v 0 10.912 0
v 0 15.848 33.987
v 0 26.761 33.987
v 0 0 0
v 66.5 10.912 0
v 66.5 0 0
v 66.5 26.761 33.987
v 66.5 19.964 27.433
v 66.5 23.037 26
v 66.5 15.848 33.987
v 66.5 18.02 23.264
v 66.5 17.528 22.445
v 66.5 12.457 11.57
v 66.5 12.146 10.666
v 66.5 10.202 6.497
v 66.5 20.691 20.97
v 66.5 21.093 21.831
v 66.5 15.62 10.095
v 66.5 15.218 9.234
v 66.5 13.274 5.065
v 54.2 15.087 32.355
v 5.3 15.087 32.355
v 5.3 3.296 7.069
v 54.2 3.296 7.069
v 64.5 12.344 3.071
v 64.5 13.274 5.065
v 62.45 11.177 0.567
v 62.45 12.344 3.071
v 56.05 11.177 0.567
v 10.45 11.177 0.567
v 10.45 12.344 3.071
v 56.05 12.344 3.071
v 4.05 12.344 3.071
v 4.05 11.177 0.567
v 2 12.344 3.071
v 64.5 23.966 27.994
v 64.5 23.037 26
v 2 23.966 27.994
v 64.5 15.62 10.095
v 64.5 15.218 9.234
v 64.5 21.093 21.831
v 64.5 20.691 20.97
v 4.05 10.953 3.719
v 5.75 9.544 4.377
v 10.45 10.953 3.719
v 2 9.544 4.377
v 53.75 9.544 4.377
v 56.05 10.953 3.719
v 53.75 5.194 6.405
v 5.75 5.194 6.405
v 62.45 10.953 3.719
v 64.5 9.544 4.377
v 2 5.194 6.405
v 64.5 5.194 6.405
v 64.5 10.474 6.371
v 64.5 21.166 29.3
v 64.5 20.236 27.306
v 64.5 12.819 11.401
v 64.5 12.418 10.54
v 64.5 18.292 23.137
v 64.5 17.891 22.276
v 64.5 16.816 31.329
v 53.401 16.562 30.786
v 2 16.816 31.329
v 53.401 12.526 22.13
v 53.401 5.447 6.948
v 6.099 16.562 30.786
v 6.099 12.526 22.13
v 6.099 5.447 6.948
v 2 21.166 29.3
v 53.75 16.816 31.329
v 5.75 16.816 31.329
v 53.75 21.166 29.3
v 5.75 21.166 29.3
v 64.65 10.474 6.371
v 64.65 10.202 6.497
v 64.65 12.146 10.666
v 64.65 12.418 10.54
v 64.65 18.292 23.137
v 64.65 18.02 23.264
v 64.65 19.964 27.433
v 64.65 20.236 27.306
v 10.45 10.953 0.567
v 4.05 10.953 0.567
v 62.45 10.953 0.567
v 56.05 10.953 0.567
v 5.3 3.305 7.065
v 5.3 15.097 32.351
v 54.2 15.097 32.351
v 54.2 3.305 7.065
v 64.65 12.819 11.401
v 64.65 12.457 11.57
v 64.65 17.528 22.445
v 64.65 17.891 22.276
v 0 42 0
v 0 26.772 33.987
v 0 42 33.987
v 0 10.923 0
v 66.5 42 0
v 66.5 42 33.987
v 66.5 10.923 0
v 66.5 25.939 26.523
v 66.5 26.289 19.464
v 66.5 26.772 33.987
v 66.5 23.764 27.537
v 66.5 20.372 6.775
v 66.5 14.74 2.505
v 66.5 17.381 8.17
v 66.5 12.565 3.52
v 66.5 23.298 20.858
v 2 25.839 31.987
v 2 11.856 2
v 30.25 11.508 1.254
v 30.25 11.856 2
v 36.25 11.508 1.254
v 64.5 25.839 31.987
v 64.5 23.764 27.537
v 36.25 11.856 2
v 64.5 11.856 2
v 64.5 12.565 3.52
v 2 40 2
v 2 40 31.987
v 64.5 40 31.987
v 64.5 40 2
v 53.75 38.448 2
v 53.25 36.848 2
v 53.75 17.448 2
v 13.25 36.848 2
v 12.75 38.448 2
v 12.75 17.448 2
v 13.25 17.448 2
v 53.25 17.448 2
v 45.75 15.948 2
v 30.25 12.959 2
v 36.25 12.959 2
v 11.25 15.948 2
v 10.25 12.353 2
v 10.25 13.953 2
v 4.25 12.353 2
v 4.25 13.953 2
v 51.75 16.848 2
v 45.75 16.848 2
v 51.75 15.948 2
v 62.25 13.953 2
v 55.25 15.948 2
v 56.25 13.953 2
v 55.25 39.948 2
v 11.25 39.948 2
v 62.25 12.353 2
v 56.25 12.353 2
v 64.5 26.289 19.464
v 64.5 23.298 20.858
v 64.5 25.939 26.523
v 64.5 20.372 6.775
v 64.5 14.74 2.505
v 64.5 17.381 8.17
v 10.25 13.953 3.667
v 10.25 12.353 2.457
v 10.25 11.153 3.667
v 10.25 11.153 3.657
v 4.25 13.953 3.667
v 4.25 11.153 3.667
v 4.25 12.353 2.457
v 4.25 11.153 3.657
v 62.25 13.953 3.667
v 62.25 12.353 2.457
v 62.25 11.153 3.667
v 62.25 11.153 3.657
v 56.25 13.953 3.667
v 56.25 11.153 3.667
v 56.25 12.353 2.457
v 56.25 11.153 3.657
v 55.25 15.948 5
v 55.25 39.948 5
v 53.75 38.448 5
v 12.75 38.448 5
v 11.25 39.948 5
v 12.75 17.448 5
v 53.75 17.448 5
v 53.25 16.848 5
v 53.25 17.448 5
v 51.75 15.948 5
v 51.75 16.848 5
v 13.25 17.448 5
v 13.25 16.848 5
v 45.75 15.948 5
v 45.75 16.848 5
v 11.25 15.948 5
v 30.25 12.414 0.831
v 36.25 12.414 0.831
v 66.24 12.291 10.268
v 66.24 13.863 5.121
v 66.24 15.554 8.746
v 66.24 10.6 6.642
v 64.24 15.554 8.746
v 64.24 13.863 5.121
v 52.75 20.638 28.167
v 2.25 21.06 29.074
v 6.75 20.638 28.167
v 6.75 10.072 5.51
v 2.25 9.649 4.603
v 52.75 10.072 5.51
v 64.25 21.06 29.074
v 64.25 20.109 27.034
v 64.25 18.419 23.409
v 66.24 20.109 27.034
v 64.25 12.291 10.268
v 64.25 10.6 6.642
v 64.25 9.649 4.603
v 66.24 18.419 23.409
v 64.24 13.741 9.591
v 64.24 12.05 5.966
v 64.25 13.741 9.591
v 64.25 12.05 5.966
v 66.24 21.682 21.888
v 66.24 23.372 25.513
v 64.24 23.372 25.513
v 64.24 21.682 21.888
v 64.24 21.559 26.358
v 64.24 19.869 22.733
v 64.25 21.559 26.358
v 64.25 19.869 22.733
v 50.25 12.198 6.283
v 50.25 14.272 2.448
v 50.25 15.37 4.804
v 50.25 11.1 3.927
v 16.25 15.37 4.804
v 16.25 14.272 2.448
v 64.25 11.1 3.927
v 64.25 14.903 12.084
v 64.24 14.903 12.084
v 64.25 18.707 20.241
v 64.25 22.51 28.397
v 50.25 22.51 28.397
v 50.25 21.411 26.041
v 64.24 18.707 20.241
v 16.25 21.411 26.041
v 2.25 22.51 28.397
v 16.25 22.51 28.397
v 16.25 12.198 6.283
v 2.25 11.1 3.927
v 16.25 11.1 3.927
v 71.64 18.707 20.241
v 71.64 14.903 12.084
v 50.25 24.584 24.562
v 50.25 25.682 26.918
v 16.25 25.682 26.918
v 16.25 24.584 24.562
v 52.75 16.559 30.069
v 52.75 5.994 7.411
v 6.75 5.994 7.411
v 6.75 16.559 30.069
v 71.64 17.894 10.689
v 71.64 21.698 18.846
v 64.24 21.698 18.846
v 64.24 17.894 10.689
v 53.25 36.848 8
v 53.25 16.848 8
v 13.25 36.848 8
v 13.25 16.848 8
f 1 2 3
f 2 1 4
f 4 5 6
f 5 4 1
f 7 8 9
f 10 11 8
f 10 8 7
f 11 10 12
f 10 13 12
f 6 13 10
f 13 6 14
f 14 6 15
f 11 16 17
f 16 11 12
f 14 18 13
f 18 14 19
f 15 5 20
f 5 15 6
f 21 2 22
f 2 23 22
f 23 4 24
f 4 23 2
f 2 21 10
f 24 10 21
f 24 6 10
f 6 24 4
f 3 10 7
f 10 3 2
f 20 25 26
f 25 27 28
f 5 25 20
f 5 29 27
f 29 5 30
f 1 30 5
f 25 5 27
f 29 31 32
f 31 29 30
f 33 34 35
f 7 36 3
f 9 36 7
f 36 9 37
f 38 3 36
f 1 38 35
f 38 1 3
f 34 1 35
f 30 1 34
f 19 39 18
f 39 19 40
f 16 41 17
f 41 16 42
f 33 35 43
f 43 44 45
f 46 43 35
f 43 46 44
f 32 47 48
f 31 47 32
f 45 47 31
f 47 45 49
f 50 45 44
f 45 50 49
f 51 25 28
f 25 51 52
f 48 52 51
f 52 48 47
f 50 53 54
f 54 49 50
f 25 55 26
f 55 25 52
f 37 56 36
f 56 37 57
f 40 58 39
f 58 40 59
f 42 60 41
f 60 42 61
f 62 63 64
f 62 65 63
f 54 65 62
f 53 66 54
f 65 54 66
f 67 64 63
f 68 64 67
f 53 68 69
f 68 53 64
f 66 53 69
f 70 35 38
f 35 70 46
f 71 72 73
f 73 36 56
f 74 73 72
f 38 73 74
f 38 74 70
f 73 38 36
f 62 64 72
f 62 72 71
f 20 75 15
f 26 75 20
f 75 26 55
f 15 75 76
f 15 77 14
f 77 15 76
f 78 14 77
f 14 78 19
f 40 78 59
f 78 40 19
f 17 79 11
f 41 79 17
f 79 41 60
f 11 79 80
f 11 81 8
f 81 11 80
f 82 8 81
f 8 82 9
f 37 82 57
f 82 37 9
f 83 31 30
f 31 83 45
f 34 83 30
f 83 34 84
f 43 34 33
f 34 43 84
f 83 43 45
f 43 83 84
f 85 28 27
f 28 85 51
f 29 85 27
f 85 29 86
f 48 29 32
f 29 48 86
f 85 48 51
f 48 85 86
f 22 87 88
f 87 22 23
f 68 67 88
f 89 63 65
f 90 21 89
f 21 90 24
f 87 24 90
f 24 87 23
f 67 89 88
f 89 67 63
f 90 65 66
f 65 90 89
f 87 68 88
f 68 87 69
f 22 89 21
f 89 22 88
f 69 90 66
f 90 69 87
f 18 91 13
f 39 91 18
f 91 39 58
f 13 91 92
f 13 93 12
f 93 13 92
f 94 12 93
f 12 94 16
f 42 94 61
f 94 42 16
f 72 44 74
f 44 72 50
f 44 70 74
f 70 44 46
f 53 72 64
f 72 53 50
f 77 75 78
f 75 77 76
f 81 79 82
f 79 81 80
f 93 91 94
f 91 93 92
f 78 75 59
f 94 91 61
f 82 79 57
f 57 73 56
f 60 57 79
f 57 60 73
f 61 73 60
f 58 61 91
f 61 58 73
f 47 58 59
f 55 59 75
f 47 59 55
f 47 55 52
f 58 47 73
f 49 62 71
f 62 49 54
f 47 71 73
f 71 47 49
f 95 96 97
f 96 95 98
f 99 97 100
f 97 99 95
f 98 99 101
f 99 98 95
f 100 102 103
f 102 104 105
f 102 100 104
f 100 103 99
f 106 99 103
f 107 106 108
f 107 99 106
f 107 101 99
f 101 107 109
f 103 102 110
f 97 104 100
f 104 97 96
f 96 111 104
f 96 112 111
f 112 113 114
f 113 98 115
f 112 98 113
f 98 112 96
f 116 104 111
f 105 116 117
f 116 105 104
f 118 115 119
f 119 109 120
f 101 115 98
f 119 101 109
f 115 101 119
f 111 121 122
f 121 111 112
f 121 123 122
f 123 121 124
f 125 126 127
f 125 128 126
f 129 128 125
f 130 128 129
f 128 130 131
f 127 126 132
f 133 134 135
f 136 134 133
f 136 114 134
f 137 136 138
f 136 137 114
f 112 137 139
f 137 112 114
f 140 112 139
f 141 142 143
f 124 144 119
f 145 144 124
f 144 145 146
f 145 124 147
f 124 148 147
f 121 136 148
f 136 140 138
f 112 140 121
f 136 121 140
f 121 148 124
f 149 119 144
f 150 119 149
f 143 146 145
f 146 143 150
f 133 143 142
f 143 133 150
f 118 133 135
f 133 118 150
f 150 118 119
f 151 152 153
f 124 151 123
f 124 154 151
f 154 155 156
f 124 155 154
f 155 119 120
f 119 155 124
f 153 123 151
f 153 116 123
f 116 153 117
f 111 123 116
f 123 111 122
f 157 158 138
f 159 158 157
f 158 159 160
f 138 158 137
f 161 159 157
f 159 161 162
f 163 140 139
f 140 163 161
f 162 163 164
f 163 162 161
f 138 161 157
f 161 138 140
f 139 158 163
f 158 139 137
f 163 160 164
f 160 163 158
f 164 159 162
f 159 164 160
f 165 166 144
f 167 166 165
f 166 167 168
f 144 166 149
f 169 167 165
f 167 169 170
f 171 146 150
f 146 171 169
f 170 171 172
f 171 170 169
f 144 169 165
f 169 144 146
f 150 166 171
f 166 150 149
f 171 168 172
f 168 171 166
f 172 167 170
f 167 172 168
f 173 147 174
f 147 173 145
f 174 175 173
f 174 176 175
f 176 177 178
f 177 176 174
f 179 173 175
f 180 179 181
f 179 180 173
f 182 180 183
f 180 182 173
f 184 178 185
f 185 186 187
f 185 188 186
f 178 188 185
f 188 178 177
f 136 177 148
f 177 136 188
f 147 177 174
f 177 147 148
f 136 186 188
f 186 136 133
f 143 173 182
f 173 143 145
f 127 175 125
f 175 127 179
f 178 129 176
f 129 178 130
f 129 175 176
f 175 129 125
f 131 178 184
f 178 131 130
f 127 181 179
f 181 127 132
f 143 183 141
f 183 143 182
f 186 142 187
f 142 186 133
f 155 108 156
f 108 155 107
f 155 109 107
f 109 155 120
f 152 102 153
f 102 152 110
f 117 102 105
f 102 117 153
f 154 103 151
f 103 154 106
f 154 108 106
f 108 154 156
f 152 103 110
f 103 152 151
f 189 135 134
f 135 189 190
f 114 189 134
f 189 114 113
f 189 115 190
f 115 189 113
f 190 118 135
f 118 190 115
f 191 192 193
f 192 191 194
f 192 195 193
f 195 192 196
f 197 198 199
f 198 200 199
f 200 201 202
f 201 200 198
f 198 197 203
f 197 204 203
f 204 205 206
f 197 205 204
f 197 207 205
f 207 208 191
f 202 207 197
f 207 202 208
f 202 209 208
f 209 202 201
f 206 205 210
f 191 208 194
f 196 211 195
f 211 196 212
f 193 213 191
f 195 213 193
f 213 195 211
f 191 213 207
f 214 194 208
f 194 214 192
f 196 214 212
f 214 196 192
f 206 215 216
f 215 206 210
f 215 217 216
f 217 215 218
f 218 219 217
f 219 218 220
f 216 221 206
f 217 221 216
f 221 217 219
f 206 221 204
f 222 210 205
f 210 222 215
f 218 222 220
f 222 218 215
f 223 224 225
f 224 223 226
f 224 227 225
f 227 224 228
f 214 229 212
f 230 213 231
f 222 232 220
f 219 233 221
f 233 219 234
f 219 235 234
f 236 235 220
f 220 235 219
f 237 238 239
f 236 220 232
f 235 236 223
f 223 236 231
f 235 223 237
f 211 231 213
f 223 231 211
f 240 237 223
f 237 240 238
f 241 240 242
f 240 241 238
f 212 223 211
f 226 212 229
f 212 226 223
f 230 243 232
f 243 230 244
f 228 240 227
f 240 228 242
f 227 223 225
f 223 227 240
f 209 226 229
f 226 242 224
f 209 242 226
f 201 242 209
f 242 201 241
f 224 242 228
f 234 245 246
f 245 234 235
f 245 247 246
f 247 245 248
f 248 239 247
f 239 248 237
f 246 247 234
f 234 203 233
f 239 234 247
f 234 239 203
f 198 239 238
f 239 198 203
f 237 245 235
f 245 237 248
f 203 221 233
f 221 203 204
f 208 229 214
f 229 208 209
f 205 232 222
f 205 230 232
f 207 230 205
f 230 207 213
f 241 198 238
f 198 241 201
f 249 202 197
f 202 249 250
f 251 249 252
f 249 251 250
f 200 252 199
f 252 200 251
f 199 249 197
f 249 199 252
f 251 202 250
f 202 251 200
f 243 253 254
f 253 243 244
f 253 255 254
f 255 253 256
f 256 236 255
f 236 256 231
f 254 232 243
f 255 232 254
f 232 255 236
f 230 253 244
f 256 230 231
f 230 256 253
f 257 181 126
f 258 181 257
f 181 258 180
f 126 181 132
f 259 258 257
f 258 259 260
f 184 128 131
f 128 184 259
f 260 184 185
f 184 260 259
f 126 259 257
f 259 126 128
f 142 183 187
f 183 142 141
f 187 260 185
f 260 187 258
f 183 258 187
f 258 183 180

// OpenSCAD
// T-Display S3 wedge desk-stand case — two shells, snap-fit.
// Spec: docs/superpowers/specs/2026-07-02-3d-printed-case-design.md
// Dims:  case/dimensions.md   (all mm)
//
// Assembly frame: desk = XY plane, +z up, +y toward the back of the wedge.
// Screen face leans back `tilt` deg from vertical; its outer surface contains
// the front bottom edge of the wedge (y=0, z=0).
// Face frame (used by on_face()): XY = screen face outer surface, +x device
// width, +y up along the slope, +z INTO the case.

/* [Render] */
mode = "assembly"; // [assembly, board, front, back, clash, probe_board, probe_board_back, probe_battery, probe_seam]

/* [Board — from case/dimensions.md] */
pcb_l         = 62.0;  // measured 2026-07-03 (confirmed by published 62x26 spec)
pcb_w         = 27.0;  // measured
pcb_t         = 1.6;
disp_h        = 4.5;   // measured (glass sits 4.5 above PCB front — user confirmed net of pcb_t)
back_h        = 3.3;   // USB shell (tallest FACTORY rear part)
// The board shipped with soldered pin headers (~9.4mm pins out the back).
// DECISION (user, 2026-07-04): clip the pins flush with the header plastic.
// What remains: the 2.54mm plastic insulator strips + clipped stubs along
// both long edges — modeled conservatively as header_h-tall strips in
// board_mock; probe_board_back verifies the back shell clears them.
header_h      = 3.5;   // clipped-header residue above the PCB back face (2.54 plastic + stub)
header_l      = 34.0;  // strip length envelope (2x12 pins = 30.5, + slop), centered on the board
header_w      = 2.6;   // strip width, sitting flush at each long board edge
// act_* now describe the measured GLASS envelope (user measured glass edges,
// not lit pixels — dark UI background). The window is cut win_inset INSIDE
// this envelope so the bezel overlaps the glass border slightly; the lit area
// (~41.7 x 22.2 panel spec) sits well inside with ~1mm slack per side.
act_l         = 46.0;  // glass length, measured
act_w         = 25.0;  // glass width, measured
act_off_grove = 4.5;   // glass edge from Grove board edge, measured
act_off_bot   = 1.0;   // (pcb_w - act_w)/2 — glass centered across the board width
btn_spacing   = 18.5;  // measured (was a 15.0 guess)
btn_w         = 4.0;

/* [Battery 602040] */
bat_l = 40.0;
bat_w = 20.0;
bat_t = 6.0;

/* [Case] */
tilt       = 25;   // [15:5:40] face back-lean from vertical, deg
wall       = 2.0;
board_fit  = 0.25; // clearance around the board pocket
snap_fit   = 0.20; // clearance on snap fits
switch_clr = 0.3;  // clearance around the side-switch cap in the button opening
win_inset  = 0.55; // window cut this far INSIDE the glass envelope (act_*) per
                   // side: bezel overlaps the glass border 0.55mm — hides the
                   // glass edge, keeps the window clear of the ledge strips
                   // (bottom ledge reaches pocket-y 1.5; window starts at
                   // act_off_bot + win_inset = 1.55), zero pixel-shadow risk.
glass_gap  = 0.3;  // gap between bezel inner face and display glass
seam_gap   = 1.5;  // seam offset behind the PCB back face
base_d     = 42.0; // wedge base depth (front edge to back wall; 42 so the battery bay, pushed back to clear the clipped headers, still fits ahead of the back wall)
chin       = 6.0;  // bottom bezel extension: pocket must clear the base AND the clipped-header bottom row (fz up to wall+glass_gap+disp_h+pcb_t+header_h = 11.9) must stay ≥0.4 above the base floor
usb_slot_w = 12.0; // fits the spec's ~12mm cable boot; hard ceiling ≈13.9 at btn_spacing 18.5 (user's boot unmeasured — coupon verifies)
section    = false; // cut-away view down the center for cavity inspection
clip_w     = 6.0;  // snap-clip arm width (along x)
clip_t     = 1.6;  // snap-clip arm wall thickness
clip_hook  = 1.2;  // snap-clip hook protrusion / engagement depth

/* [Hidden] */
$fn = 48;
eps = 0.01;

// ── Derived ─────────────────────────────────────────────
face_w  = pcb_l + 2*(board_fit + wall);          // wedge width (x)
face_l  = pcb_w + 2*(board_fit + wall) + chin;   // bezel length along slope
wedge_h = face_l * sin(90 - tilt);               // wedge height
face_run = face_l * cos(90 - tilt);              // horizontal run of the face
// Board-pocket origin in face-frame coords (single source of truth,
// reused by Tasks 4-5). The chin pushes the pocket up off the bottom
// edge so it doesn't exit the wedge's zero-depth front corner.
px0     = wall + board_fit;
py0     = wall + board_fit + chin;
// Front-shell slice depth: seam sits seam_gap behind the PCB back face.
// Rear components (back_h tall — USB shell etc.) deliberately protrude
// past the seam into the back shell's cavity (sized in Task 5).
tray_d  = wall + glass_gap + disp_h + pcb_t + seam_gap;
wedge_d = base_d;
// Battery bay footprint (0.5mm slop per side); foam tape supplies retention.
// A raised retaining rib ring — NOT a recess: the back cavity is already
// hollow here (a recess cut would remove empty space), so the "bay" is walls.
bay_l = bat_l + 1;   // 41
bay_w = bat_w + 1;   // 21
bay_d = bat_t + 0.5; // 6.5  (nominal cell height + slop; used by asserts)
// Pocket inner edges in face-frame fy (single source; strips lie just outside).
pocket_fy0 = py0 - board_fit;                       // bottom inner edge (6.2)
pocket_fy1 = pocket_fy0 + (face_l - 2*wall - chin); // top inner edge (32.7)
// Face-slab XY overshoot pads, DERIVED from tilt: the slabs must reach the
// wedge top edge at seam depth (fy_top), else they stop short and a trench
// opens across the closed case's top face (fy_top grows as tilt increases,
// so fixed pads would silently reopen the trench at higher tilt). Front and
// back keep DIFFERENT pads (CGAL coincident-boundary rule — see face_slab).
fy_top    = (wedge_h + tray_d*cos(90 - tilt)) / sin(90 - tilt); // 38.52 @ tilt=25
pad_front = (fy_top - face_l) + 1.0;                            // 4.82  @ tilt=25
pad_back  = (fy_top - face_l) + 2.5;                            // 6.32  @ tilt=25

assert(wedge_d > face_run + wall, "base too shallow for the face slope");
// Battery bay (recomputed for base_d=40 / chin=4.2): the flat base region runs
// from the slope top (face_run) to the back-wall inner face (wedge_d-wall); it
// must hold the battery's width + slop. Binds at ~1.8mm margin.
assert(wedge_d - face_run - wall >= bay_w + 0.5, "base too shallow for battery bay");
assert(bay_d + wall < wedge_h/2, "battery bay deeper than the base region");
// Checks the cavity's actual front-bottom edge: wedge_cavity_front()
// starts at face-y = py0 - board_fit, not py0.
assert((py0 - board_fit)*sin(90 - tilt) - tray_d*cos(90 - tilt) >= wall - eps,
       "board pocket exits the wedge base - increase chin");

// ── Helpers ─────────────────────────────────────────────
// Face frame -> assembly frame. NOTE: the face frame is left-handed by
// design (x width-right, y up-slope, z INTO the case) — the mirror below
// makes that work. Never put chiral geometry (e.g. text) inside on_face().
module on_face() {
    rotate([90 - tilt, 0, 0]) mirror([0, 0, 1]) children();
}

// ── Reference mocks (never printed) ────────────────────
// Board in face frame: display glass toward -z, PCB behind it.
// Origin: board's lower-left corner at x=0,y=0 of the *pocket*; callers
// translate by wall+board_fit. z=0 is the display glass top surface.
module board_mock() {
    color("DarkGreen") translate([0, 0, disp_h])
        cube([pcb_l, pcb_w, pcb_t]);                       // PCB
    color("Black") translate([act_off_grove_x(), act_off_bot, 0])
        cube([act_l, act_w, disp_h]);                      // display block
    color("Silver")                                        // USB-C, right edge
        translate([pcb_l - eps, pcb_w/2 - 4.5, disp_h + pcb_t])
            cube([7.4, 9.0, 3.3]);
    for (s = [-1, 1]) color("Orange")                      // buttons flank USB
        translate([pcb_l - eps, pcb_w/2 + s*btn_spacing/2 - btn_w/2, disp_h])
            cube([2.0, btn_w, pcb_t + 2.0]);
    for (y = [0, pcb_w - header_w]) color("Purple")        // clipped pin headers,
        translate([(pcb_l - header_l)/2, y, disp_h + pcb_t]) // one strip per long edge
            cube([header_l, header_w, header_h]);
}
function act_off_grove_x() = act_off_grove;  // active area starts at Grove end

module battery_mock() {
    color("SteelBlue") cube([bat_l, bat_w, bat_t]);
}

// ── Wedge solid + shell split (Tasks 3-5) ───────────────
// Side profile in the y-z plane, extruded along x.
module wedge_outer() {
    rotate([90, 0, 90])           // put polygon's x=depth(y), y=height(z)
        linear_extrude(face_w)
            polygon([[0, 0], [wedge_d, 0], [wedge_d, wedge_h],
                     [face_run, wedge_h]]);
}

// Slab of thickness t starting at depth d behind the face plane. `pad` is
// the XY overshoot. It is NOT merely "clipped away by wedge_outer() anyway":
// the top face of the closed case leans back, so at seam depth the wedge's
// top edge reaches face-frame fy_top (≈38.5 at tilt=25). The pad MUST push
// the slab past that, or the slab stops short of the top edge and opens a
// trench across the full top seam — so the overshoot is load-bearing at the
// top, and the pads are derived from tilt (pad_front/pad_back above).
// front_blank and back_blank pass DIFFERENT pad values (pad_front vs
// pad_back, 1.5 apart) so their slab cubes never share an exact coincident
// XY boundary; CGAL renders a spurious sliver at such boundaries even when
// the Z-ranges don't overlap.
module face_slab(d, t, pad = pad_front) {
    on_face() translate([-pad, -pad, d])
        cube([face_w + 2*pad, face_l + 2*pad, t]);
}

// Interior cavity: wedge shrunk by `wall` on all faces except the front
// face (the bezel handles that side in the front shell).
module wedge_cavity() {
    rotate([90, 0, 90]) translate([0, 0, wall])
        linear_extrude(face_w - 2*wall)
            offset(delta = -wall)
                polygon([[0, 0], [wedge_d, 0], [wedge_d, wedge_h],
                         [face_run, wedge_h]]);
}

module front_blank() {
    difference() {
        // Kept region ends at tray_d - eps (not tray_d + eps as originally
        // drafted) so it stops just short of back_blank's start (tray_d) —
        // a hairline gap, not an overlap, so the two shells never clash.
        intersection() { wedge_outer(); face_slab(-eps, tray_d); }
        wedge_cavity_front();
    }
}

// Cavity portion inside the front slice: the board pocket volume.
// Starts at px0/py0 (not the raw wall offset) so the chin band below
// the pocket stays solid instead of being hollowed out.
module wedge_cavity_front() {
    on_face() translate([px0 - board_fit, py0 - board_fit, wall])
        cube([face_w - 2*wall, face_l - 2*wall - chin, tray_d]); // over-deep: trimmed by slab
}

module back_blank() {
    difference() {
        // Slab thickness is tray_d+1 (not tray_d) so the removed region's
        // far edge lands at tray_d, matching front_blank's kept boundary —
        // using just "tray_d" here left a ~1mm gap of double-claimed
        // material and made front_blank/back_blank overlap at the seam.
        // pad_back (vs front_blank's default pad_front): different XY
        // overshoot so the two slabs' cubes don't share a coincident
        // boundary, and both reach past the wedge top edge (fy_top) so
        // neither leaves a trench (pads derived from tilt).
        difference() { wedge_outer(); face_slab(-1, tray_d + 1, pad = pad_back); }
        wedge_cavity();
    }
}

module maybe_section() {
    if (section)
        difference() { children();
            translate([face_w/2, -5, -1]) cube([face_w, wedge_d + 10, wedge_h + 10]); }
    else children();
}

// ── Front shell features (Task 4) ───────────────────────
// Window: 45° chamfer from a large opening at the outer (visible, print-bed)
// face down to a tight opening (glass envelope minus win_inset) at the inner
// (cavity) face, tapering over exactly the wall thickness — self-supporting
// when printed face-down (bed = outer face, printing proceeds inward).
module screen_window() {
    on_face() translate([px0 + act_off_grove, py0 + act_off_bot, 0])
        hull() {
            // Inner opening: win_inset inside the glass envelope, cut
            // through into the cavity.
            translate([win_inset, win_inset, wall - eps])
                cube([act_l - 2*win_inset, act_w - 2*win_inset, 3]);
            // Outer opening: flared by `wall` per side beyond the inner
            // one, over the wall thickness — 45° outward chamfer.
            translate([win_inset - wall, win_inset - wall, -1])
                cube([act_l - 2*win_inset + 2*wall,
                      act_w - 2*win_inset + 2*wall, 1 + eps]);
        }
}

module usb_slot() {   // right wall, centered on board width; usb_slot_w x 7.
    // y-width matches the connector mock exactly, not +margin: the real
    // board only leaves 1mm between the USB footprint and each button, so a
    // wider cut merges with the button openings — margin is carried in
    // Z-height and X-depth instead.
    on_face() translate([face_w - wall - 1, py0 + pcb_w/2 - usb_slot_w/2,
                         wall + glass_gap + disp_h + pcb_t - 2])
        cube([wall + 2, usb_slot_w, 7]);
}

// One button opening — direct press. The T-Display S3 side-switch cap
// projects ~2mm past the PCB edge, to fx≈60.24: 1.74mm into the 2mm wall and
// only 0.26mm shy of the outer face. Any covering flap/nub is therefore
// impossible (a printed membrane could cover at most ~0.9mm of protrusion),
// which also made a living hinge meaningless — the cap itself is the button
// surface. Each opening clears the cap footprint (btn_w × (pcb_t+2)), grown
// by switch_clr per side, straight through the wall; the switch is pressed
// directly. Board∩shell stays empty (probe_board).
module button_cut(center_y) {
    on_face() translate([face_w - wall - 1,
                         center_y - btn_w/2 - switch_clr,
                         wall + glass_gap + disp_h - switch_clr])
        cube([wall + 2, btn_w + 2*switch_clr, pcb_t + 2 + 2*switch_clr]);
}

// Ledge strips the board's display-side face rests on. They live at the
// board's SHORT ends now: the measured glass envelope (46 of 62 long, 25 of
// a 27 board width) leaves no usable PCB rim along the long edges — the
// original long-edge strips overlapped the glass by ~0.5mm and probe_board
// went solid (board could not seat). The bare front-face rim that actually
// exists is x < act_off_grove (antenna end) and x > act_off_grove + act_l
// (USB end); each strip stays glass_clr clear of the glass edge (absorbs
// board_fit shift + the ±0.5 caliper) and is oversized by ledge_bite INTO
// its end wall and the top/bottom walls: a strip that merely touches the
// cavity boundary sits on a CGAL coincident plane and stays a disconnected
// volume in the rendered solid — a real overlap fuses it.
ledge_bite = 0.15;
glass_clr  = 1.0;   // ledge keep-out from each glass edge
module ledges() {
    x_pairs = [ [px0 - board_fit - ledge_bite,                    // antenna end
                 px0 + act_off_grove - glass_clr],
                [px0 + act_off_grove + act_l + glass_clr,         // USB end
                 face_w - wall + ledge_bite] ];
    on_face() for (p = x_pairs)
        translate([p[0], py0 - board_fit - ledge_bite, wall])
            cube([p[1] - p[0],
                  pcb_w + 2*board_fit + 2*ledge_bite,
                  glass_gap + disp_h]);
}

// ── Back shell features (Task 5) ────────────────────────
// Retention: 2 bottom-strip rigid hooks only. The top clips were removed — in
// back.stl print orientation (base-down) they were unsupported islands starting
// at z=28 over an empty column (they'd have printed as spaghetti and endangered
// the whole part), and their seam-normal retention was ~zero anyway. The case is
// a friction-fit lid (see README): closure holds via the snug seam, the bottom
// hooks resisting shear/slide, and the foam-taped battery filling the cavity. A
// flexing cantilever tongue on the left END WALL engaging a front through-window
// is the documented v2 retention upgrade (printable both orientations) — not
// built here.
// The bottom seam sits at the base with no vertical room for a flexing
// cantilever (the board fills the pocket just above), so the bottom hooks are
// rigid: fused to the base-floor solid, each reaching a chamfered lip toward -y
// (toward the chin) into a slot in the front bottom strip. Closure is rotate-in:
// the chin slides under the hooks bottom-first, then the lid seats; the pry slot
// releases. Slots are grown by snap_fit so each clip sits inside a slot VOID in
// the closed pose -> front∩back stays empty. Plain rectangular posts + wedge
// lips, chamfered on the insertion side, no rounding.
clip_xs        = [ face_w/2 - 26, face_w/2 + 26 ];  // 2 bottom clips, pushed to the
// board's ends: the clipped-header bottom row sweeps through the old ±16
// positions behind the seam corner; at ±26 the hooks sit outside the
// header_l envelope (probe_board_back verifies)
// Bottom rigid retention hook sizing: the front's chin slides under the hooks
// bottom-first during the rotate-in close; the hook overhangs the chin's
// pocket-facing ramp so the chin cannot lift out.
clip_lift_bot  = 0.6;   // hook lip height above the seam corner (chin is close only here)
clip_foot_bot  = 1.5;   // post depth below the corner (into base-floor solid)

// Assembly-frame point of a face-frame seam corner (fx, fy) at the seam depth.
function seam_pt(fx, fy) = [ fx,
    fy*cos(90 - tilt) + tray_d*sin(90 - tilt),
    fy*sin(90 - tilt) - tray_d*cos(90 - tilt) ];

// Bottom rigid hook: short post on the back rim + lip overhanging -y (toward
// the chin), chamfered on the underside for the rotate-in close.
module bot_clip(A) {
    zt = A[2] + clip_lift_bot;
    zb = A[2] - clip_foot_bot;
    translate([A[0] - clip_w/2, A[1], zb]) cube([clip_w, clip_t, zt - zb]);
    hull() {                                             // lip toward -y, chamfer under
        translate([A[0] - clip_w/2, A[1] - clip_hook, zt - eps])
            cube([clip_w, clip_hook + clip_t, eps]);     // top of lip (full reach)
        translate([A[0] - clip_w/2, A[1], zt - clip_hook - eps])
            cube([clip_w, clip_t, eps]);                 // chamfer down to arm face
    }
}
module bot_slot(A) {
    zt = A[2] + clip_lift_bot;
    zb = A[2] - clip_foot_bot;
    // clear the whole post + lip envelope (grown by snap_fit) from the chin
    translate([A[0] - clip_w/2 - snap_fit, A[1] - clip_hook - snap_fit, zb - 1])
        cube([clip_w + 2*snap_fit, clip_hook + clip_t + 2*snap_fit,
              (zt - zb) + 1 + snap_fit]);
}

module clips()      { for (x = clip_xs) bot_clip(seam_pt(x, pocket_fy0)); }
module clip_slots() { for (x = clip_xs) bot_slot(seam_pt(x, pocket_fy0)); }

// Battery retaining rib ring on the base floor (0.5mm slop/side). Bites 0.2mm
// into the floor so it fuses (see ledge_bite precedent). Gap in the seam-facing
// (-y) wall passes the JST lead. (The former jst_channel guide walls are gone:
// their hardcoded y=12 start landed in front of the deepened seam AND inside
// the clipped-header sweep — clash + probe_board_back both flagged them — and
// the measured 86mm lead has so much slack that the bay gap alone guides it.)
rib_t = 1.5; rib_h = 3.0;
bay_x0 = (face_w - bay_l)/2;
bay_y0 = face_run + 1.6;          // pushed back: the clipped-header bottom row's
                                  // deepest corner sweeps to y≈15.4 in front of
                                  // the old rib position (probe_board_back)
jst_gx = face_w/2 + bay_l/2 - 8;  // 42.75  (gap x-start, over the JST corner)
module battery_bay() {
    difference() {
        translate([bay_x0 - rib_t, bay_y0 - rib_t, wall - 0.2])
            cube([bay_l + 2*rib_t, bay_w + 2*rib_t, rib_h + 0.2]);
        translate([bay_x0, bay_y0, wall - 0.2 - eps])
            cube([bay_l, bay_w, rib_h + 0.4]);                       // interior
        translate([jst_gx, bay_y0 - rib_t - eps, wall - 0.2 - eps])
            cube([6, rib_t + 2*eps, rib_h + 0.4]);                   // JST gap
    }
}
// Seam reliefs: rear-side components protrude past the seam into the back shell
// (USB shell fz~6.7-10, buttons fz~5.1-8.7 vs seam tray_d=8.2) and the USB
// cable/boot needs a path. Cut the back rim aligned with usb_slot() + behind
// each button opening. Unlike the FRONT usb_slot (which must stay usb_slot_w
// to clear the button openings), the back reliefs have no such neighbour, so
// they carry +1mm margin per side to over-clear the components (a relief exactly
// the component width leaves a coincident-boundary sliver — verified by probe).
rlf_m = 1.0;   // relief margin per side
module seam_reliefs() {
    on_face() translate([face_w - wall - 2, py0 + pcb_w/2 - usb_slot_w/2 - rlf_m, tray_d - 0.6])
        cube([wall + 3, usb_slot_w + 2*rlf_m, back_h + 3]);          // USB + boot
    for (s = [-1, 1])
        on_face() translate([face_w - wall - 2,
                             py0 + pcb_w/2 + s*btn_spacing/2 - (btn_w + 2)/2 - rlf_m, tray_d - 0.6])
            cube([wall + 3, btn_w + 2 + 2*rlf_m, 3]);                // button relief
}

// Pry slot: finger/spudger access notch, centered on the bottom seam edge.
module pry_slot() {
    on_face() translate([face_w/2 - 3, pocket_fy0 - 2, tray_d - 2])
        cube([6, 4, 3]);
}

module front_shell() {
    maybe_section() union() {
        difference() {
            front_blank();
            screen_window();
            usb_slot();
            for (s = [-1, 1]) button_cut(py0 + pcb_w/2 + s*btn_spacing/2);
            clip_slots();
        }
        ledges();
    }
}
module back_shell() {
    maybe_section() difference() {
        union() { back_blank(); clips(); battery_bay(); }
        seam_reliefs();
        pry_slot();
    }
}
// No separate test-fit coupon: the front shell is already only tray_d
// (8.2mm) deep and contains everything a coupon would test (board pocket,
// window, USB slot, button openings) — a truncated coupon came out
// geometrically identical to front_shell(), so front.stl IS the coupon.
// Print it first; see case/README.md for the test-fit checklist.

// Print-bed orientation for front_shell(): rotates the tilted bezel
// face down flat onto z=0 for slicing. PURE ROTATION about the assembly x
// axis only (no mirror()) — chirality of the solid is unchanged, only its
// pose is. Equivalent to the two-step rotate([180,0,0]) rotate([-(90-tilt),0,0])
// (both rotations share the x axis, so they just add: 180 + tilt-90 = 90+tilt).
// Empirically confirmed (case/previews/orient/): the bezel face lands flat at
// z=0 with the rest of the shell at z>=0, and a top view shows the USB/button
// wall on the same (+x, right) side as the assembly reference — not mirrored.
module print_orient() {
    rotate([90 + tilt, 0, 0]) children();
}

// ── Render dispatch ─────────────────────────────────────
if (mode == "board") {
    board_mock();
    translate([wall + 5, -35, 0]) battery_mock();
} else if (mode == "front") {
    print_orient() front_shell();
} else if (mode == "back") {
    back_shell();          // already base-down at z>=0 in the assembly frame
} else if (mode == "clash") {
    // Full shells (clips + slots): the clips slide into oversized slot VOIDS,
    // so the true intersection must stay EMPTY.
    intersection() { front_shell(); back_shell(); }
} else if (mode == "probe_board") {
    // Expected EMPTY: the board, placed exactly as in assembly, must not
    // intersect the front shell (no PCB/switch-cap/USB interpenetration).
    intersection() {
        on_face() translate([px0, py0, wall + glass_gap]) board_mock();
        front_shell();
    }
} else if (mode == "probe_board_back") {
    // Expected EMPTY: the board — including the clipped-header strips —
    // must not intersect the BACK shell (base floor, battery-bay ribs,
    // JST guides, bottom hooks, seam rim). Added when the pin-header
    // decision landed: probe_board alone only ever checked the front.
    intersection() {
        on_face() translate([px0, py0, wall + glass_gap]) board_mock();
        back_shell();
    }
} else if (mode == "probe_battery") {
    // Expected EMPTY: the battery, placed exactly as in assembly, must not
    // intersect the back shell (bay ribs clear the cell + slop).
    intersection() {
        translate([bay_x0 + 0.5, bay_y0 + 0.5, wall]) battery_mock();
        back_shell();
    }
} else if (mode == "probe_seam") {
    // Closed-case top-seam trench test. Expected EMPTY: a thin box lying in
    // the outer top wall, in the band where a top-seam trench would open
    // (just in front of the seam line), must be fully filled by the two
    // shells — any leftover is the reopened top trench. Tilt-aware: the box
    // is keyed off the seam line's top-face intercept (seam_top_y, ≈23.7 at
    // tilt=25) and stops 1.5mm short of it so it never picks up the
    // intentional 0.01mm inter-shell hairline gap (which leans back by
    // ~1.2mm over the box height even at tilt=40); a real trench shows as
    // tens of mm³.
    seam_top_y = fy_top*cos(90 - tilt) + tray_d*sin(90 - tilt);
    difference() {
        translate([3, seam_top_y - 7.5, wedge_h - 1.4])
            cube([face_w - 6, 6, 1.3]);
        front_shell();
        back_shell();
    }
} else { // assembly
    front_shell();
    back_shell();
    on_face() translate([px0, py0, wall + glass_gap])
        board_mock();
    translate([(face_w - bat_l)/2, face_run + 1, wall])
        battery_mock();
}
